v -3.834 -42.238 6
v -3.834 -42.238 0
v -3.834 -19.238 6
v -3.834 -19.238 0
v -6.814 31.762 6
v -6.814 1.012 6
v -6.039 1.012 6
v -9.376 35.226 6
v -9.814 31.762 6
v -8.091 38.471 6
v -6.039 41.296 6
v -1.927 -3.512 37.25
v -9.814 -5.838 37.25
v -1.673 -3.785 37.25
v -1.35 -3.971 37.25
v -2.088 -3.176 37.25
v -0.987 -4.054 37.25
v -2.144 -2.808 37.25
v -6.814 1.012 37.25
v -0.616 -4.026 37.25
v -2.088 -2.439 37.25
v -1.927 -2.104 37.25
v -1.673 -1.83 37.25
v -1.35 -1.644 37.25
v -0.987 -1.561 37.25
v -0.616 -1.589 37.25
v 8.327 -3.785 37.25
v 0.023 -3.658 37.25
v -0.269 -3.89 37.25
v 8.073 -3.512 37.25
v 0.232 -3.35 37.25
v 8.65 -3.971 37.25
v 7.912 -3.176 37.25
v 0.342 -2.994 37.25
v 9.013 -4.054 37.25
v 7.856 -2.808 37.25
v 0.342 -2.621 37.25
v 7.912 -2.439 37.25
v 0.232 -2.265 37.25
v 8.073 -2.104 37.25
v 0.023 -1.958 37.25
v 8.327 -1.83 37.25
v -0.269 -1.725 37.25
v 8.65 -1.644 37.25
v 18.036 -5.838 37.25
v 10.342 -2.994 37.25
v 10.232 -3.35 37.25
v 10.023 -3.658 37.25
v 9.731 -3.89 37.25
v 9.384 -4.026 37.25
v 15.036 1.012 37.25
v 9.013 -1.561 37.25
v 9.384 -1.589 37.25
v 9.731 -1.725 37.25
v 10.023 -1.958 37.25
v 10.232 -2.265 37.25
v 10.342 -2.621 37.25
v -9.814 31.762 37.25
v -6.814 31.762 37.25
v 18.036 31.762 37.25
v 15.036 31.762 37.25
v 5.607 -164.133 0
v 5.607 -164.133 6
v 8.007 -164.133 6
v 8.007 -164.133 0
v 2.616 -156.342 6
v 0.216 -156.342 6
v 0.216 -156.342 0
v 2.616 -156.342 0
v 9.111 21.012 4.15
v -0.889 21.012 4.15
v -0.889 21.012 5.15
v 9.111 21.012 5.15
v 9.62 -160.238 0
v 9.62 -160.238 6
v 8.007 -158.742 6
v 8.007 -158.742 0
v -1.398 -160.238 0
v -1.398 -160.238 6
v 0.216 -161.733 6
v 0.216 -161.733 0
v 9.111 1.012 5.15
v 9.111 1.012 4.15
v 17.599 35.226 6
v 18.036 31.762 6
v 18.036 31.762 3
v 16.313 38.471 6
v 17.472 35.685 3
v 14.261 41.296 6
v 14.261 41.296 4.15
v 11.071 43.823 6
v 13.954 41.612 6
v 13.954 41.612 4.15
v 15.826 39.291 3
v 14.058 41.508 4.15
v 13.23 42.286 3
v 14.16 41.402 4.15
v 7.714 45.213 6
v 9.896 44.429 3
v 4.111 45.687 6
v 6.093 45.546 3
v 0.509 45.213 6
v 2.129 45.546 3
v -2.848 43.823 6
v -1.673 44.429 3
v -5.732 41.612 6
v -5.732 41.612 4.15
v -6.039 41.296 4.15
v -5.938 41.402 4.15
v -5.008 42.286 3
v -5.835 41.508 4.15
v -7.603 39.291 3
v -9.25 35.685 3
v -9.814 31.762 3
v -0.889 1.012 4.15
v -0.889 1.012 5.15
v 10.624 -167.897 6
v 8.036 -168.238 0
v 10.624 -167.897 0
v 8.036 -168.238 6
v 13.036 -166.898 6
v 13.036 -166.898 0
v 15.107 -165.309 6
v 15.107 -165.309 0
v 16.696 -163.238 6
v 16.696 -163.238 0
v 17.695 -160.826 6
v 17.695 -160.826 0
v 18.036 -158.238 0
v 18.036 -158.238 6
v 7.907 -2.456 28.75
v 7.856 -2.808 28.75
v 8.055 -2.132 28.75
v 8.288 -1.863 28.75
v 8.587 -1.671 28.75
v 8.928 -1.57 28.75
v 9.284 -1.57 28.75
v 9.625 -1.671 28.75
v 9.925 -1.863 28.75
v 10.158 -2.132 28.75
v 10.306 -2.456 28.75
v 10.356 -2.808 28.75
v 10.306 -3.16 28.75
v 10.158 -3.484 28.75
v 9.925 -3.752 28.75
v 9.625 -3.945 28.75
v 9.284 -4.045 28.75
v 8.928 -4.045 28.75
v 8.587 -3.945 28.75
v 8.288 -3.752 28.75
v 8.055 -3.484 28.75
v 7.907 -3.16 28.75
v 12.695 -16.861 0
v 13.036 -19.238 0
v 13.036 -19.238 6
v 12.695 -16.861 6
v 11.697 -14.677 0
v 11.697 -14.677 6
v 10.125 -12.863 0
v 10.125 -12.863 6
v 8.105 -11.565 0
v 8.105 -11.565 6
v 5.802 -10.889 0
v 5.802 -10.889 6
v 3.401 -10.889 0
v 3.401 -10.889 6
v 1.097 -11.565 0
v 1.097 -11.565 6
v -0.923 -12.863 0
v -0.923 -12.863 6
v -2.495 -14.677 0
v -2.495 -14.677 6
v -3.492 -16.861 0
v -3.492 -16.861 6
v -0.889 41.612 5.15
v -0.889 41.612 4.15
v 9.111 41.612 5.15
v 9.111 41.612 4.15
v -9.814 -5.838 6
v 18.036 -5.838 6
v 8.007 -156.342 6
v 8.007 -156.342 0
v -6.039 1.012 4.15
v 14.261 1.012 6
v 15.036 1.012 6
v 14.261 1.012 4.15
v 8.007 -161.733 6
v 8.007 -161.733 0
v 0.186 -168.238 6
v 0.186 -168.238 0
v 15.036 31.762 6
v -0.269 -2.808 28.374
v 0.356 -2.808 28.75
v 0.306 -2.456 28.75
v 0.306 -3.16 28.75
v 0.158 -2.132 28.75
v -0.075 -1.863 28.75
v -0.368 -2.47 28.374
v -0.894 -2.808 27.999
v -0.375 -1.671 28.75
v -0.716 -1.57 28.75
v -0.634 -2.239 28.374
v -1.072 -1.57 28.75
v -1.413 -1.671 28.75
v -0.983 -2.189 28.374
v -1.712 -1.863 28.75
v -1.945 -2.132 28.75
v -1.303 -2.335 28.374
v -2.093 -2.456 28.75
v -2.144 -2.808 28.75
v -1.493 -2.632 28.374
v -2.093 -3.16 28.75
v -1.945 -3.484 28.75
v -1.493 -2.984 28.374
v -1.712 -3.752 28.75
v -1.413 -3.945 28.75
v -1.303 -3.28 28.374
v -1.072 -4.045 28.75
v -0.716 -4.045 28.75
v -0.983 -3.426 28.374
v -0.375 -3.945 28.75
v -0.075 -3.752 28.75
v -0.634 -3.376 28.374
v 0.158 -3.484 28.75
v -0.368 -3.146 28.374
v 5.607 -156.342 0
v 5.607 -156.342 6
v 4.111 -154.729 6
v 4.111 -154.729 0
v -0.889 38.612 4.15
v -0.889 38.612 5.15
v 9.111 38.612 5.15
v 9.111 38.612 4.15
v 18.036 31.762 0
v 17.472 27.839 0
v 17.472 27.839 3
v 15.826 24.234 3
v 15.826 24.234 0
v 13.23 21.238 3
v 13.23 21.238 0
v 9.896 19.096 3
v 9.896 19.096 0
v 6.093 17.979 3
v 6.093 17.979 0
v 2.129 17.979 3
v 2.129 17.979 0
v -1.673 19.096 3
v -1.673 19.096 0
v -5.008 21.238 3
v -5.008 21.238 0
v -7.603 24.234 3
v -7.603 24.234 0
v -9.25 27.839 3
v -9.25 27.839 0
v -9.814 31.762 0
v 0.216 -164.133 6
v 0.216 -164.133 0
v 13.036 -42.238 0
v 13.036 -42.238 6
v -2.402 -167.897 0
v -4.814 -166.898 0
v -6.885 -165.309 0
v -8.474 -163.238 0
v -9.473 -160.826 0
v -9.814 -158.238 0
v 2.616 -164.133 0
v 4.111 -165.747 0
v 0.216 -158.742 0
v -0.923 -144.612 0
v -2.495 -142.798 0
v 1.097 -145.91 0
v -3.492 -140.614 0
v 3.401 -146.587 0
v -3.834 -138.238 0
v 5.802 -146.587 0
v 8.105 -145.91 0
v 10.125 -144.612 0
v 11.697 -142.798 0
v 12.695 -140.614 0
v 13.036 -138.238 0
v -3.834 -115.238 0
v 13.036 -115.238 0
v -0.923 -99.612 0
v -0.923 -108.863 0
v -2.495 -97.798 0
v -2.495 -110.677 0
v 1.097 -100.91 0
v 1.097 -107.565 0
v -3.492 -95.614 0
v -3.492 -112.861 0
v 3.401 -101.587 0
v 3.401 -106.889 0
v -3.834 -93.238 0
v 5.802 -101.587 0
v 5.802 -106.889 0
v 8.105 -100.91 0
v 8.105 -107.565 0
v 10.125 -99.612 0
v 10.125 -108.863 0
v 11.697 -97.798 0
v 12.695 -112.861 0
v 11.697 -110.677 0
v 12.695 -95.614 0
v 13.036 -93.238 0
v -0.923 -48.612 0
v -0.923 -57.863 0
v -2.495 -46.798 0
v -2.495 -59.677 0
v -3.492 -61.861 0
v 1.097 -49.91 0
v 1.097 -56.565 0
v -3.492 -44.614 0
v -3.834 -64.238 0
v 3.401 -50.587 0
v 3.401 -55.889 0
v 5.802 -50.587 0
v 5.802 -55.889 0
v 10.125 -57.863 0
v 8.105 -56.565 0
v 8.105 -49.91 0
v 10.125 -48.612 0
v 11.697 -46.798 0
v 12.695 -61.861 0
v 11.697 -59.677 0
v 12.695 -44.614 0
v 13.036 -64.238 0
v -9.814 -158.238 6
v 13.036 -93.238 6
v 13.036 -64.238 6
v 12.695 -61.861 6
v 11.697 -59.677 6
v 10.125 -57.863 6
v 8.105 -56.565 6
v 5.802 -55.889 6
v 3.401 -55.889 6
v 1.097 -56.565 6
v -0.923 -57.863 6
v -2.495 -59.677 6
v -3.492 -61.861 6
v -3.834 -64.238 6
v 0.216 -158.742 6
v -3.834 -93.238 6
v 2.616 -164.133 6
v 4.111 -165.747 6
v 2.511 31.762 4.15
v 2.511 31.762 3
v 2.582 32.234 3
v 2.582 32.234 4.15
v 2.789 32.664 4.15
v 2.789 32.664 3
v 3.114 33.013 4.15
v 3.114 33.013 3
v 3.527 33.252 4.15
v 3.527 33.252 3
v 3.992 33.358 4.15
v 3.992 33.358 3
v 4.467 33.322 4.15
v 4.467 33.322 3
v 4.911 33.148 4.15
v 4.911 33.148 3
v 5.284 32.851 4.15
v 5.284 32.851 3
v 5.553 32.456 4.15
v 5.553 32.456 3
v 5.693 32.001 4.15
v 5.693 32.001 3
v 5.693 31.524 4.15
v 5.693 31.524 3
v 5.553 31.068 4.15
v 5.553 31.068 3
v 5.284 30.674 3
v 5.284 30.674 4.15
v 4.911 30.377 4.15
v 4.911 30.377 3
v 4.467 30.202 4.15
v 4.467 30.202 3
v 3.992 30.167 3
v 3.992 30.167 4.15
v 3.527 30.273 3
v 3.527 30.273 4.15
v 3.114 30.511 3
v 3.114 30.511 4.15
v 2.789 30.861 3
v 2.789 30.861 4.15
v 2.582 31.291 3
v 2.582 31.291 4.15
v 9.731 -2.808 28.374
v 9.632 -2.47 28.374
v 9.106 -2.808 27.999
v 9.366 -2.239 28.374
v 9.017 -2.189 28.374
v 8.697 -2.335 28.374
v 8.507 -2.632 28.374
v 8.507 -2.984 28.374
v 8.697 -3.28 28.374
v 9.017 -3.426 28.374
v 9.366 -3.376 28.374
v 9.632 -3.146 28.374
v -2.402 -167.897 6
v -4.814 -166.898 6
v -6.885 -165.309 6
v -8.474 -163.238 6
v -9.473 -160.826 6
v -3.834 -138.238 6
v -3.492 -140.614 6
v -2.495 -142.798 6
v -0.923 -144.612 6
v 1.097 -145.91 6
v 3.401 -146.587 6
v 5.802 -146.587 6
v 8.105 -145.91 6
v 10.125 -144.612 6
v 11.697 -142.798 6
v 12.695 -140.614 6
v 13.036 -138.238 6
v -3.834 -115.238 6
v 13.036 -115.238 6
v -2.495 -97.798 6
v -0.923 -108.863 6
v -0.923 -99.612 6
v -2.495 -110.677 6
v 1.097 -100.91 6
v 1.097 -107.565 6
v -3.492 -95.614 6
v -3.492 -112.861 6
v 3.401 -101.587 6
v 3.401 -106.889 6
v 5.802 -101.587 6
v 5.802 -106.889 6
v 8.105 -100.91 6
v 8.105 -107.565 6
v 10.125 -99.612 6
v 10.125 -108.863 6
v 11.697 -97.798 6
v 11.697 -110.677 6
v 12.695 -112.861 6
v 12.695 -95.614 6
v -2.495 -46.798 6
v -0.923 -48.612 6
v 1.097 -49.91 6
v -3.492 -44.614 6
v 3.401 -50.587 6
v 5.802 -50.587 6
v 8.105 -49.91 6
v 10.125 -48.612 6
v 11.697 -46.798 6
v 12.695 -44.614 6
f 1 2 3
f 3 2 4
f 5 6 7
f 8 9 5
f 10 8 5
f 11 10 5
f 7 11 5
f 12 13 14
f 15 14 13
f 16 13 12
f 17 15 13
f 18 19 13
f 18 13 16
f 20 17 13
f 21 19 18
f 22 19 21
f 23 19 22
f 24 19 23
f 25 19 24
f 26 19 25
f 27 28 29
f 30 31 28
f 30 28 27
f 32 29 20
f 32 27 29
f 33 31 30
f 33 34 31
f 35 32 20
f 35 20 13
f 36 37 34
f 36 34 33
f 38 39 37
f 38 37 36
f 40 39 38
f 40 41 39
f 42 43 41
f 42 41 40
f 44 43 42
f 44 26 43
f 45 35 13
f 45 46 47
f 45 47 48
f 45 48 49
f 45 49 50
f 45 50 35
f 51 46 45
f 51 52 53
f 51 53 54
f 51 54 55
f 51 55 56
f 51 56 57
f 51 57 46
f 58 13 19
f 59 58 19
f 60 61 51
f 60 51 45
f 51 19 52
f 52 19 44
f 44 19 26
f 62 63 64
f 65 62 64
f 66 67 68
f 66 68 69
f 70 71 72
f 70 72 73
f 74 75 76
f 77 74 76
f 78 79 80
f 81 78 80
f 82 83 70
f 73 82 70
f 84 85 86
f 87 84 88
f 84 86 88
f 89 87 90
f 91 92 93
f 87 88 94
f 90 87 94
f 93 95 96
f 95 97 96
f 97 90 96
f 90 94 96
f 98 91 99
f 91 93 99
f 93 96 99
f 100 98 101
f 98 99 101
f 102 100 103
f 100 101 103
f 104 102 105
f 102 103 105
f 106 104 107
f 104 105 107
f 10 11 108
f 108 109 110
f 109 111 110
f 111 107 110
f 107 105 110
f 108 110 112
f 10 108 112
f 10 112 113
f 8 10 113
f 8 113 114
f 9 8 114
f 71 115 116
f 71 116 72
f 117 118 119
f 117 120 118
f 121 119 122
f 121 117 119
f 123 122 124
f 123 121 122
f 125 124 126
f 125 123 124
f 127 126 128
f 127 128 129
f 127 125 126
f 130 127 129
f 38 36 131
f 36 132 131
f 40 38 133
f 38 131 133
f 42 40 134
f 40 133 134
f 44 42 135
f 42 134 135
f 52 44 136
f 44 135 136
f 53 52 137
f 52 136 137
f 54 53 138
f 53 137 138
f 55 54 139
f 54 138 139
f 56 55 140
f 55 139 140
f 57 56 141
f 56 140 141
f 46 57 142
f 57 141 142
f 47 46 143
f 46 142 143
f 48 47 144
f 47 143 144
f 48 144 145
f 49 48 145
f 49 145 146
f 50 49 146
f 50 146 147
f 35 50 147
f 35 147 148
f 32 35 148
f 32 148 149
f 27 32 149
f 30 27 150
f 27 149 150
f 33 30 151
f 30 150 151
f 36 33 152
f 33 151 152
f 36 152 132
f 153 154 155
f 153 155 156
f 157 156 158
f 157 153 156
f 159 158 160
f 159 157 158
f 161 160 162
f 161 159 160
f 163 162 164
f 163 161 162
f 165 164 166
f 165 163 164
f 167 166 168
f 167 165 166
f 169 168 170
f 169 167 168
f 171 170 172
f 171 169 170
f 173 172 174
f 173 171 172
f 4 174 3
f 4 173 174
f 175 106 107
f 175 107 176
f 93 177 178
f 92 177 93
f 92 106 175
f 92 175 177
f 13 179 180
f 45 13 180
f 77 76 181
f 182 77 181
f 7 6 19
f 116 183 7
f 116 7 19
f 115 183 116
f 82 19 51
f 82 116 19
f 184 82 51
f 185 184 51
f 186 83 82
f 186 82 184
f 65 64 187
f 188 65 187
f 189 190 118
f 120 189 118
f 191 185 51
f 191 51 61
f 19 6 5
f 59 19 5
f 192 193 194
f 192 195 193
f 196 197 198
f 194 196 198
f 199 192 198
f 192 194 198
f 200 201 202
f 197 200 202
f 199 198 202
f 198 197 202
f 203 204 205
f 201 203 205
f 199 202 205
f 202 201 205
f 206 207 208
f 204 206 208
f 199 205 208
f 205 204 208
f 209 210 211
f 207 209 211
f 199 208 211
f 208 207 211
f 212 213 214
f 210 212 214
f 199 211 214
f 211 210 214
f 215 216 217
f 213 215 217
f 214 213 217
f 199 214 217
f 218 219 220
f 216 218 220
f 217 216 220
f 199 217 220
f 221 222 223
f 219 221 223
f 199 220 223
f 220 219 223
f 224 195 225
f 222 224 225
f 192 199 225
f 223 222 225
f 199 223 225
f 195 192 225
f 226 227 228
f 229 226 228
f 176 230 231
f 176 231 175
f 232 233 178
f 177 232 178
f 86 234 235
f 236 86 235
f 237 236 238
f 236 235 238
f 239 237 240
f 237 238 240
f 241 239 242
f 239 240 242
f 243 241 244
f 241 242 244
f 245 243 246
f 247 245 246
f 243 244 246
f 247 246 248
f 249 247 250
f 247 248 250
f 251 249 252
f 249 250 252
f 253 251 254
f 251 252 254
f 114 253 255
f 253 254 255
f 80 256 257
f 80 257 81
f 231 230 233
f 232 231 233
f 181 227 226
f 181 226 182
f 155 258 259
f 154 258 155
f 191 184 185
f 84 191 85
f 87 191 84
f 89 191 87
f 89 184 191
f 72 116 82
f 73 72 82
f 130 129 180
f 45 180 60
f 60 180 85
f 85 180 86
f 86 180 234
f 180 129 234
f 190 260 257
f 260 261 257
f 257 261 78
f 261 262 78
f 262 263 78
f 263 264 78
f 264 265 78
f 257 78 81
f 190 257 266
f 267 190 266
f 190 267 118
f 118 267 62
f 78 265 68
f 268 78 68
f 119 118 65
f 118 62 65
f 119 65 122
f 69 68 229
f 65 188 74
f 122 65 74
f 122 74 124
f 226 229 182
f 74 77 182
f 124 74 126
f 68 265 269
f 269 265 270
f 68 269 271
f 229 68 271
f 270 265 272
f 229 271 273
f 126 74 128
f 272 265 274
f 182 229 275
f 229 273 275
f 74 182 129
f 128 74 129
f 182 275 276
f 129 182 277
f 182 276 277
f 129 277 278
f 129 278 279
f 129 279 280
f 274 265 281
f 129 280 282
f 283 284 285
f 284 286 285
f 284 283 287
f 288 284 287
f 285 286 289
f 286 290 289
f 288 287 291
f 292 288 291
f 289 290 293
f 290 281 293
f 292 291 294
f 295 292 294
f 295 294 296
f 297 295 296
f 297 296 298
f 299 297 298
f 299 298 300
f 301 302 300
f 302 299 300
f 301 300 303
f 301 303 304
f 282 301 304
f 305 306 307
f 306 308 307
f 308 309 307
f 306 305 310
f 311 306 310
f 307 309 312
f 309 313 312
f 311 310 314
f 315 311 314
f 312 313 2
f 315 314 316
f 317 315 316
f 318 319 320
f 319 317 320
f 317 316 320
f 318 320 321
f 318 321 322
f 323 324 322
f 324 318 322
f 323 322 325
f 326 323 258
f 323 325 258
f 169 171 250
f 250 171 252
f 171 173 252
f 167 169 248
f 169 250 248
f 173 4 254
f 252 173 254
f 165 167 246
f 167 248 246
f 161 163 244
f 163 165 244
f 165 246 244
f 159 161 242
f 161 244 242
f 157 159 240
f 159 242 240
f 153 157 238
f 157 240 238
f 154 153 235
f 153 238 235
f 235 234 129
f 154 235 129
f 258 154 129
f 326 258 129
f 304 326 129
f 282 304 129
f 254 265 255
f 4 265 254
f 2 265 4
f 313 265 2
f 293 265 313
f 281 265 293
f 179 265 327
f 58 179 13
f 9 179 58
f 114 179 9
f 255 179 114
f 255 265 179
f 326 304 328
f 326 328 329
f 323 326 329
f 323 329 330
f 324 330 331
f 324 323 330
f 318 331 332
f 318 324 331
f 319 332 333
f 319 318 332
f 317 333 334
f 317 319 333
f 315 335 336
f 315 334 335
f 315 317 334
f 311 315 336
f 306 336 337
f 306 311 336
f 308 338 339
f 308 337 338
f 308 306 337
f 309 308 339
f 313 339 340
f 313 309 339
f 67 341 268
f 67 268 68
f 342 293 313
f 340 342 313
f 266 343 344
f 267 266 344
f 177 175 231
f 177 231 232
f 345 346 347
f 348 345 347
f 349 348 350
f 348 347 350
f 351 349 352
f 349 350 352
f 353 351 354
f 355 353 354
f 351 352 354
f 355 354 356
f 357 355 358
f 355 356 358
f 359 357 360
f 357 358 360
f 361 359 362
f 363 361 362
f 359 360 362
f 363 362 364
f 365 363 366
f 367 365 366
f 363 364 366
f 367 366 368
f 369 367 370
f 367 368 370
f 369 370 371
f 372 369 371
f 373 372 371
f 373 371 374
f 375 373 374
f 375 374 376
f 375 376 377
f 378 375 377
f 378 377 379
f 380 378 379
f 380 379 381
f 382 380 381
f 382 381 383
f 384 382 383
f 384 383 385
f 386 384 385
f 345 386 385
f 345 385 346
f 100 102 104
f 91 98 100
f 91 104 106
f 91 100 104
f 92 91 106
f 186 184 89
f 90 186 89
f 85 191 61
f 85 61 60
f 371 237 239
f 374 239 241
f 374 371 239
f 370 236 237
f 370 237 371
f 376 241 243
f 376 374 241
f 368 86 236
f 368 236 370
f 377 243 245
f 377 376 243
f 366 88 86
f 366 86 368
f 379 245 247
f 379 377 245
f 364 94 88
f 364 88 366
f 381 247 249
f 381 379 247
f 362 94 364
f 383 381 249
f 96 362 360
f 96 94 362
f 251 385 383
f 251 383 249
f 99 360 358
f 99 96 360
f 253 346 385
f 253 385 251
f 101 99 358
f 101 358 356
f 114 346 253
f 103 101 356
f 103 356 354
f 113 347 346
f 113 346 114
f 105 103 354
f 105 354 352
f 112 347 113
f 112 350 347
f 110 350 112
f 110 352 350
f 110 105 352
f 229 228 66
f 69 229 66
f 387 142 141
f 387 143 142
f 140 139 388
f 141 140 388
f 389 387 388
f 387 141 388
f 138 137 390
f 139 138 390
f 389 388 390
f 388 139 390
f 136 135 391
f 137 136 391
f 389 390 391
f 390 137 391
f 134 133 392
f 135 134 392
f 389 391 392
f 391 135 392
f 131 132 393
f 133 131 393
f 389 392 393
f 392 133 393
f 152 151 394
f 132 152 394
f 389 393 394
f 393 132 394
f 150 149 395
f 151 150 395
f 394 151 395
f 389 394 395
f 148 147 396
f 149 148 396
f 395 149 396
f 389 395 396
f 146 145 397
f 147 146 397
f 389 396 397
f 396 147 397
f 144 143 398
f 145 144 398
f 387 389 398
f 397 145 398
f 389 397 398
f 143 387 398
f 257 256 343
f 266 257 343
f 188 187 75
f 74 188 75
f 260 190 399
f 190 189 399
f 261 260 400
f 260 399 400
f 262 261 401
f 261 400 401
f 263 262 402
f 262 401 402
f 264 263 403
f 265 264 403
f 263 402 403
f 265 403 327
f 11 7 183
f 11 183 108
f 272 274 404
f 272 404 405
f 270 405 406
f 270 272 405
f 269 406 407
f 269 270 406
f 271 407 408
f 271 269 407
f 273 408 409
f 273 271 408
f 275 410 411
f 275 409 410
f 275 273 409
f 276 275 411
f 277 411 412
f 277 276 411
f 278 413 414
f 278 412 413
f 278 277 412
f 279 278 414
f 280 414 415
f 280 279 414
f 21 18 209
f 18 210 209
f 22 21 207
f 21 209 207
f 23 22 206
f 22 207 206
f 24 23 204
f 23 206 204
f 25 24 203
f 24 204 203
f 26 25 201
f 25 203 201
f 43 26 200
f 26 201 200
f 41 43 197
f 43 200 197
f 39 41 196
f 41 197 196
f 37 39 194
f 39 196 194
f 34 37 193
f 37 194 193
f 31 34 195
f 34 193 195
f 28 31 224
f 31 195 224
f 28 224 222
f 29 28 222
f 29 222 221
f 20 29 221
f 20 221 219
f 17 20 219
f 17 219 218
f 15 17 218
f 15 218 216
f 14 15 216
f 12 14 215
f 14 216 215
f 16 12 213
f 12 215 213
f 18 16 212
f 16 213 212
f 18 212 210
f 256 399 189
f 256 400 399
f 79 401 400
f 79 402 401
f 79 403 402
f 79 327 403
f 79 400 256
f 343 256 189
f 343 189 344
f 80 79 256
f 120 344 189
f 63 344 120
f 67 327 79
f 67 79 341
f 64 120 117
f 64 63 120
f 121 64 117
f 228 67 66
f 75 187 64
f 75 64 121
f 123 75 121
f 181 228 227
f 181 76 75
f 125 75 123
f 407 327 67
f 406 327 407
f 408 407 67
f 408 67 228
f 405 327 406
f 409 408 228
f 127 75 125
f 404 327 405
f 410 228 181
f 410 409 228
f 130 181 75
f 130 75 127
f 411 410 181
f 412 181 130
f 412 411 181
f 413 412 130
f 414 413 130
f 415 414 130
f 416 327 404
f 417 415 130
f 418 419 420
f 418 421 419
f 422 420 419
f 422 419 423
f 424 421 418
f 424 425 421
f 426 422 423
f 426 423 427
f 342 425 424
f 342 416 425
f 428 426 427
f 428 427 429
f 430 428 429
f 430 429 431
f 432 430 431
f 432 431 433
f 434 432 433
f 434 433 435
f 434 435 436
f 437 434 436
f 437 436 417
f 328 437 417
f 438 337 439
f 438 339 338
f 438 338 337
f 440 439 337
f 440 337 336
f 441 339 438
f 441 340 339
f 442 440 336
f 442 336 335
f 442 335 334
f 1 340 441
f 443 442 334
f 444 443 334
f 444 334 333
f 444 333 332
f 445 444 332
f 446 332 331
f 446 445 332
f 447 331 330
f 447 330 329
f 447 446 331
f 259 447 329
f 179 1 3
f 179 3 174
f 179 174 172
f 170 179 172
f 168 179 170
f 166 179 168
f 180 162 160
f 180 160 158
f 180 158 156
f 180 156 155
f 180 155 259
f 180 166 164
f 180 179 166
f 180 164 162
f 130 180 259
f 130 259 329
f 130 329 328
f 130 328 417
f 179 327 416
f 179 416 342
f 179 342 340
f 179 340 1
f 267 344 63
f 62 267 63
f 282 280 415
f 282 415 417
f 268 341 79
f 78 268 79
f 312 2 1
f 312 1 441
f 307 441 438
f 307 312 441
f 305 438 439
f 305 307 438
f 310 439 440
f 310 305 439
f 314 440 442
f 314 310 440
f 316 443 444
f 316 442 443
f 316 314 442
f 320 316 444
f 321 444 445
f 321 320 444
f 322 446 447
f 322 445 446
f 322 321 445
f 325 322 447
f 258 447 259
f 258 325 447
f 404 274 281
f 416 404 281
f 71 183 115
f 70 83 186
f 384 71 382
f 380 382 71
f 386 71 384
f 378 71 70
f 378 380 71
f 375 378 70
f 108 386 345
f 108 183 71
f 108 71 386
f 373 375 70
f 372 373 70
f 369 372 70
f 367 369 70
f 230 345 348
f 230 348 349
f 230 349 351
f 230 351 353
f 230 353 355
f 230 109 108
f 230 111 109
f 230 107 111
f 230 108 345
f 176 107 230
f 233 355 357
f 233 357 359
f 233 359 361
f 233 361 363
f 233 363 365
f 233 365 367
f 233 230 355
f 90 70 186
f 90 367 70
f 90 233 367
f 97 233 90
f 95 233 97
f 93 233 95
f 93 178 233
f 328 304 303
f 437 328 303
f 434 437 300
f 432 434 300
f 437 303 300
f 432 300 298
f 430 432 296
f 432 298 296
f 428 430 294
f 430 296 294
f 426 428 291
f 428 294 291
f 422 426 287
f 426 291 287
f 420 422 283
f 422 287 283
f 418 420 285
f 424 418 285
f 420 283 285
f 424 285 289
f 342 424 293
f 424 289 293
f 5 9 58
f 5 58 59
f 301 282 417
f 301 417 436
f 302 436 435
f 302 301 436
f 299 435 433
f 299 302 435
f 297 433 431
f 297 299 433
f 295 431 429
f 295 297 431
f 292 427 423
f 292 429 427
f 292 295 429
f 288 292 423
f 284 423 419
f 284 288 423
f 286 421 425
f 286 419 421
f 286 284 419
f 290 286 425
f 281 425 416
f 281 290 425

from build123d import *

# Parameters (mm, degrees)
ESQUISSE1_W             = 27.85
ESQUISSE1_H             = 200
BOSS_EXTRU_1_DEPTH      = 6
ESQUISSE4_W             = 7.790942256
ESQUISSE4_H             = 7.790942256
ESQUISSE4_R             = 3
ENL_V_MAT_EXTRU_3_DEPTH = 29
ESQUISSE5_R             = 13.925
ENL_V_MAT_EXTRU_4_DEPTH = 3
ESQUISSE7_W             = 16.87
ESQUISSE7_H             = 23
ESQUISSE7_H_2           = 29
ENL_V_MAT_EXTRU_6_DEPTH = 13
CONG_1_R                = 10
CONG_2_R                = 10
ESQUISSE8_R             = 1.6
ENL_V_MAT_EXTRU_7_DEPTH = 10
ESQUISSE11_W            = 20.3
ESQUISSE11_H            = 40.6
ENL_V_MAT_EXTRU_8_DEPTH = 1.85
ESQUISSE12_W            = 27.85
ESQUISSE12_H            = 6.85
BOSS_EXTRU_5_DEPTH      = 31.25
ESQUISSE14_W            = 10
ESQUISSE14_H            = 20
ESQUISSE14_H_2          = 3
BOSS_EXTRU_6_DEPTH      = 1
ESQUISSE15_W            = 3
ESQUISSE15_H            = 30.75
BOSS_EXTRU_7_DEPTH      = 31.25
TROU_TARAUD_M32_D       = 2.5
TROU_TARAUD_M32_DEPTH   = 8.5
TROU_TARAUD_M32_TIP     = 0.751075774


with BuildPart() as part:
    # Esquisse1 → Boss.-Extru.1 (new body)
    with BuildSketch(Plane.XY):
        with Locations((4.111190476, -68.237738095)):
            Rectangle(ESQUISSE1_W, ESQUISSE1_H)
        with BuildLine():
            Line((-9.813809524, 31.762261905), (18.036190476, 31.762261905))
            ThreePointArc((18.036190476, 31.762261905), (4.111190476, 45.687261905), (-9.813809524, 31.762261905))
        make_face()
    extrude(amount=BOSS_EXTRU_1_DEPTH)

    # Esquisse4 → Enlèv. mat.-Extru.3 (cut)
    # profile 1 of 9: a face of its own
    with BuildSketch(Plane.XY.offset(6)):
        Polygon((4.111190476, -154.728709994), (2.615719348, -156.342266967), (5.606661604, -156.342266967), align=None)
    # profile 2 of 9: a face of its own
    with BuildSketch(Plane.XY.offset(6)):
        with Locations((4.111190476, -160.237738095)):
            Rectangle(ESQUISSE4_W, ESQUISSE4_H)
        with Locations((4.111190476, -160.237738095)):
            Circle(ESQUISSE4_R, mode=Mode.SUBTRACT)
    # profile 3 of 9: a face of its own
    with BuildSketch(Plane.XY.offset(6)):
        Polygon((0.215719348, -161.733209223), (0.215719348, -158.742266967), (-1.397837625, -160.237738095), align=None)
    # profile 4 of 9: a face of its own
    with BuildSketch(Plane.XY.offset(6)):
        Polygon((5.606661604, -164.133209223), (2.615719348, -164.133209223), (4.111190476, -165.746766196), align=None)
    # profile 5 of 9: a face of its own
    with BuildSketch(Plane.XY.offset(6)):
        Polygon((9.620218577, -160.237738095), (8.006661604, -158.742266967), (8.006661604, -161.733209223), align=None)
    # profile 6 of 9: a face of its own
    with BuildSketch(Plane.XY.offset(6)):
        with BuildLine():
            ThreePointArc((7.111190476, -160.237738095), (4.887647611, -157.339960616), (1.513114265, -158.737738095))
            Line((1.513114265, -158.737738095), (1.513114265, -161.737738095))
            ThreePointArc((1.513114265, -161.737738095), (4.887647611, -163.135515574), (7.111190476, -160.237738095))
        make_face()
    # profile 7 of 9: a face of its own
    with BuildSketch(Plane.XY.offset(6)):
        with BuildLine():
            Line((1.513114265, -161.737738095), (1.513114265, -158.737738095))
            ThreePointArc((1.513114265, -158.737738095), (1.111190476, -160.237738095), (1.513114265, -161.737738095))
        make_face()
    # profile 8 of 9: a face of its own
    with BuildSketch(Plane.XY.offset(6)):
        with BuildLine():
            ThreePointArc((7.111190476, -160.237738095), (4.887647611, -157.339960616), (1.513114265, -158.737738095))
            Line((1.513114265, -158.737738095), (1.513114265, -161.737738095))
            ThreePointArc((1.513114265, -161.737738095), (4.887647611, -163.135515574), (7.111190476, -160.237738095))
        make_face()
    # profile 9 of 9: a face of its own
    with BuildSketch(Plane.XY.offset(6)):
        with BuildLine():
            Line((1.513114265, -161.737738095), (1.513114265, -158.737738095))
            ThreePointArc((1.513114265, -158.737738095), (1.111190476, -160.237738095), (1.513114265, -161.737738095))
        make_face()
    extrude(amount=-ENL_V_MAT_EXTRU_3_DEPTH, mode=Mode.SUBTRACT)

    # Esquisse5 → Enlèv. mat.-Extru.4 (cut)
    with BuildSketch(Plane(origin=(0, 0, 0), x_dir=(-1, 0, 0), z_dir=(0, 0, -1))):
        with Locations((-4.111190476, 31.762261905)):
            Circle(ESQUISSE5_R)
    extrude(amount=-ENL_V_MAT_EXTRU_4_DEPTH, mode=Mode.SUBTRACT)

    # Esquisse7 → Enlèv. mat.-Extru.6 (cut)
    with BuildSketch(Plane(origin=(0, 0, 0), x_dir=(-1, 0, 0), z_dir=(0, 0, -1))):
        with BuildLine():
            ThreePointArc((-13.036190476, -115.237738095), (-4.601190476, -106.802738095), (3.833809524, -115.237738095))
            Line((3.833809524, -115.237738095), (-13.036190476, -115.237738095))
        make_face()
        with Locations((-4.601190476, -126.737738095)):
            Rectangle(ESQUISSE7_W, ESQUISSE7_H)
        with BuildLine():
            Line((-13.036190476, -138.237738095), (3.833809524, -138.237738095))
            ThreePointArc((3.833809524, -138.237738095), (-4.601190476, -146.672738095), (-13.036190476, -138.237738095))
        make_face()
        with BuildLine():
            Line((3.833809524, -93.237738095), (-13.036190476, -93.237738095))
            ThreePointArc((-13.036190476, -93.237738095), (-4.601190476, -101.672738095), (3.833809524, -93.237738095))
        make_face()
        with Locations((-4.601190476, -78.737738095)):
            Rectangle(ESQUISSE7_W, ESQUISSE7_H_2)
        with BuildLine():
            Line((3.833809524, -64.237738095), (-13.036190476, -64.237738095))
            ThreePointArc((-13.036190476, -64.237738095), (-4.601190476, -55.802738095), (3.833809524, -64.237738095))
        make_face()
        with BuildLine():
            ThreePointArc((3.833809524, -42.237738095), (-4.601190476, -50.672738095), (-13.036190476, -42.237738095))
            Line((-13.036190476, -42.237738095), (3.833809524, -42.237738095))
        make_face()
        with Locations((-4.601190476, -30.737738095)):
            Rectangle(ESQUISSE7_W, ESQUISSE7_H)
        with BuildLine():
            Line((3.833809524, -19.237738095), (-13.036190476, -19.237738095))
            ThreePointArc((-13.036190476, -19.237738095), (-4.601190476, -10.802738095), (3.833809524, -19.237738095))
        make_face()
    extrude(amount=-ENL_V_MAT_EXTRU_6_DEPTH, mode=Mode.SUBTRACT)

    # Congé1
    cong_1_edges = [part.edges().sort_by_distance(p)[0] for p in [
        (18.036190476, -168.237738095, 3),
    ]]
    fillet(cong_1_edges, radius=CONG_1_R)

    # Congé2
    cong_2_edges = [part.edges().sort_by_distance(p)[0] for p in [
        (-9.813809524, -168.237738095, 3),
    ]]
    fillet(cong_2_edges, radius=CONG_2_R)

    # Esquisse8 → Enlèv. mat.-Extru.7 (cut)
    with BuildSketch(Plane(origin=(0, 0, 3), x_dir=(-1, 0, 0), z_dir=(0, 0, -1))):
        with Locations((-4.111190476, 31.762261905)):
            Circle(ESQUISSE8_R)
    extrude(amount=-ENL_V_MAT_EXTRU_7_DEPTH, mode=Mode.SUBTRACT)

    # Esquisse11 → Enlèv. mat.-Extru.8 (cut)
    with BuildSketch(Plane.XY.offset(6)):
        with Locations((4.111190476, 21.312261905)):
            Rectangle(ESQUISSE11_W, ESQUISSE11_H)
    extrude(amount=-ENL_V_MAT_EXTRU_8_DEPTH, mode=Mode.SUBTRACT)

    # Esquisse12 → Boss.-Extru.5 (add)
    with BuildSketch(Plane.XY.offset(6)):
        with Locations((4.111190476, -2.412738095)):
            Rectangle(ESQUISSE12_W, ESQUISSE12_H)
    extrude(amount=BOSS_EXTRU_5_DEPTH)

    # Esquisse14 → Boss.-Extru.6 (add)
    with BuildSketch(Plane.XY.offset(4.15)):
        with Locations((4.111190476, 11.012261905)):
            Rectangle(ESQUISSE14_W, ESQUISSE14_H)
        with Locations((4.111190476, 40.112261905)):
            Rectangle(ESQUISSE14_W, ESQUISSE14_H_2)
    extrude(amount=BOSS_EXTRU_6_DEPTH)

    # Esquisse15 → Boss.-Extru.7 (add)
    with BuildSketch(Plane.XY.offset(6)):
        with Locations((-8.313809524, 16.387261905)):
            Rectangle(ESQUISSE15_W, ESQUISSE15_H)
        with Locations((16.536190476, 16.387261905)):
            Rectangle(ESQUISSE15_W, ESQUISSE15_H)
    extrude(amount=BOSS_EXTRU_7_DEPTH)

    # Trou taraudé M32
    with Locations(Plane.XY.offset(37.25)):
        with Locations((-0.893809524, -2.807738095), (9.106190476, -2.807738095)):
            Hole(TROU_TARAUD_M32_D / 2, depth=TROU_TARAUD_M32_DEPTH)
            with Locations((0, 0, -(TROU_TARAUD_M32_DEPTH + TROU_TARAUD_M32_TIP / 2))):  # 118° drill point
                Cone(0, TROU_TARAUD_M32_D / 2, TROU_TARAUD_M32_TIP, mode=Mode.SUBTRACT)


solid = part.part
